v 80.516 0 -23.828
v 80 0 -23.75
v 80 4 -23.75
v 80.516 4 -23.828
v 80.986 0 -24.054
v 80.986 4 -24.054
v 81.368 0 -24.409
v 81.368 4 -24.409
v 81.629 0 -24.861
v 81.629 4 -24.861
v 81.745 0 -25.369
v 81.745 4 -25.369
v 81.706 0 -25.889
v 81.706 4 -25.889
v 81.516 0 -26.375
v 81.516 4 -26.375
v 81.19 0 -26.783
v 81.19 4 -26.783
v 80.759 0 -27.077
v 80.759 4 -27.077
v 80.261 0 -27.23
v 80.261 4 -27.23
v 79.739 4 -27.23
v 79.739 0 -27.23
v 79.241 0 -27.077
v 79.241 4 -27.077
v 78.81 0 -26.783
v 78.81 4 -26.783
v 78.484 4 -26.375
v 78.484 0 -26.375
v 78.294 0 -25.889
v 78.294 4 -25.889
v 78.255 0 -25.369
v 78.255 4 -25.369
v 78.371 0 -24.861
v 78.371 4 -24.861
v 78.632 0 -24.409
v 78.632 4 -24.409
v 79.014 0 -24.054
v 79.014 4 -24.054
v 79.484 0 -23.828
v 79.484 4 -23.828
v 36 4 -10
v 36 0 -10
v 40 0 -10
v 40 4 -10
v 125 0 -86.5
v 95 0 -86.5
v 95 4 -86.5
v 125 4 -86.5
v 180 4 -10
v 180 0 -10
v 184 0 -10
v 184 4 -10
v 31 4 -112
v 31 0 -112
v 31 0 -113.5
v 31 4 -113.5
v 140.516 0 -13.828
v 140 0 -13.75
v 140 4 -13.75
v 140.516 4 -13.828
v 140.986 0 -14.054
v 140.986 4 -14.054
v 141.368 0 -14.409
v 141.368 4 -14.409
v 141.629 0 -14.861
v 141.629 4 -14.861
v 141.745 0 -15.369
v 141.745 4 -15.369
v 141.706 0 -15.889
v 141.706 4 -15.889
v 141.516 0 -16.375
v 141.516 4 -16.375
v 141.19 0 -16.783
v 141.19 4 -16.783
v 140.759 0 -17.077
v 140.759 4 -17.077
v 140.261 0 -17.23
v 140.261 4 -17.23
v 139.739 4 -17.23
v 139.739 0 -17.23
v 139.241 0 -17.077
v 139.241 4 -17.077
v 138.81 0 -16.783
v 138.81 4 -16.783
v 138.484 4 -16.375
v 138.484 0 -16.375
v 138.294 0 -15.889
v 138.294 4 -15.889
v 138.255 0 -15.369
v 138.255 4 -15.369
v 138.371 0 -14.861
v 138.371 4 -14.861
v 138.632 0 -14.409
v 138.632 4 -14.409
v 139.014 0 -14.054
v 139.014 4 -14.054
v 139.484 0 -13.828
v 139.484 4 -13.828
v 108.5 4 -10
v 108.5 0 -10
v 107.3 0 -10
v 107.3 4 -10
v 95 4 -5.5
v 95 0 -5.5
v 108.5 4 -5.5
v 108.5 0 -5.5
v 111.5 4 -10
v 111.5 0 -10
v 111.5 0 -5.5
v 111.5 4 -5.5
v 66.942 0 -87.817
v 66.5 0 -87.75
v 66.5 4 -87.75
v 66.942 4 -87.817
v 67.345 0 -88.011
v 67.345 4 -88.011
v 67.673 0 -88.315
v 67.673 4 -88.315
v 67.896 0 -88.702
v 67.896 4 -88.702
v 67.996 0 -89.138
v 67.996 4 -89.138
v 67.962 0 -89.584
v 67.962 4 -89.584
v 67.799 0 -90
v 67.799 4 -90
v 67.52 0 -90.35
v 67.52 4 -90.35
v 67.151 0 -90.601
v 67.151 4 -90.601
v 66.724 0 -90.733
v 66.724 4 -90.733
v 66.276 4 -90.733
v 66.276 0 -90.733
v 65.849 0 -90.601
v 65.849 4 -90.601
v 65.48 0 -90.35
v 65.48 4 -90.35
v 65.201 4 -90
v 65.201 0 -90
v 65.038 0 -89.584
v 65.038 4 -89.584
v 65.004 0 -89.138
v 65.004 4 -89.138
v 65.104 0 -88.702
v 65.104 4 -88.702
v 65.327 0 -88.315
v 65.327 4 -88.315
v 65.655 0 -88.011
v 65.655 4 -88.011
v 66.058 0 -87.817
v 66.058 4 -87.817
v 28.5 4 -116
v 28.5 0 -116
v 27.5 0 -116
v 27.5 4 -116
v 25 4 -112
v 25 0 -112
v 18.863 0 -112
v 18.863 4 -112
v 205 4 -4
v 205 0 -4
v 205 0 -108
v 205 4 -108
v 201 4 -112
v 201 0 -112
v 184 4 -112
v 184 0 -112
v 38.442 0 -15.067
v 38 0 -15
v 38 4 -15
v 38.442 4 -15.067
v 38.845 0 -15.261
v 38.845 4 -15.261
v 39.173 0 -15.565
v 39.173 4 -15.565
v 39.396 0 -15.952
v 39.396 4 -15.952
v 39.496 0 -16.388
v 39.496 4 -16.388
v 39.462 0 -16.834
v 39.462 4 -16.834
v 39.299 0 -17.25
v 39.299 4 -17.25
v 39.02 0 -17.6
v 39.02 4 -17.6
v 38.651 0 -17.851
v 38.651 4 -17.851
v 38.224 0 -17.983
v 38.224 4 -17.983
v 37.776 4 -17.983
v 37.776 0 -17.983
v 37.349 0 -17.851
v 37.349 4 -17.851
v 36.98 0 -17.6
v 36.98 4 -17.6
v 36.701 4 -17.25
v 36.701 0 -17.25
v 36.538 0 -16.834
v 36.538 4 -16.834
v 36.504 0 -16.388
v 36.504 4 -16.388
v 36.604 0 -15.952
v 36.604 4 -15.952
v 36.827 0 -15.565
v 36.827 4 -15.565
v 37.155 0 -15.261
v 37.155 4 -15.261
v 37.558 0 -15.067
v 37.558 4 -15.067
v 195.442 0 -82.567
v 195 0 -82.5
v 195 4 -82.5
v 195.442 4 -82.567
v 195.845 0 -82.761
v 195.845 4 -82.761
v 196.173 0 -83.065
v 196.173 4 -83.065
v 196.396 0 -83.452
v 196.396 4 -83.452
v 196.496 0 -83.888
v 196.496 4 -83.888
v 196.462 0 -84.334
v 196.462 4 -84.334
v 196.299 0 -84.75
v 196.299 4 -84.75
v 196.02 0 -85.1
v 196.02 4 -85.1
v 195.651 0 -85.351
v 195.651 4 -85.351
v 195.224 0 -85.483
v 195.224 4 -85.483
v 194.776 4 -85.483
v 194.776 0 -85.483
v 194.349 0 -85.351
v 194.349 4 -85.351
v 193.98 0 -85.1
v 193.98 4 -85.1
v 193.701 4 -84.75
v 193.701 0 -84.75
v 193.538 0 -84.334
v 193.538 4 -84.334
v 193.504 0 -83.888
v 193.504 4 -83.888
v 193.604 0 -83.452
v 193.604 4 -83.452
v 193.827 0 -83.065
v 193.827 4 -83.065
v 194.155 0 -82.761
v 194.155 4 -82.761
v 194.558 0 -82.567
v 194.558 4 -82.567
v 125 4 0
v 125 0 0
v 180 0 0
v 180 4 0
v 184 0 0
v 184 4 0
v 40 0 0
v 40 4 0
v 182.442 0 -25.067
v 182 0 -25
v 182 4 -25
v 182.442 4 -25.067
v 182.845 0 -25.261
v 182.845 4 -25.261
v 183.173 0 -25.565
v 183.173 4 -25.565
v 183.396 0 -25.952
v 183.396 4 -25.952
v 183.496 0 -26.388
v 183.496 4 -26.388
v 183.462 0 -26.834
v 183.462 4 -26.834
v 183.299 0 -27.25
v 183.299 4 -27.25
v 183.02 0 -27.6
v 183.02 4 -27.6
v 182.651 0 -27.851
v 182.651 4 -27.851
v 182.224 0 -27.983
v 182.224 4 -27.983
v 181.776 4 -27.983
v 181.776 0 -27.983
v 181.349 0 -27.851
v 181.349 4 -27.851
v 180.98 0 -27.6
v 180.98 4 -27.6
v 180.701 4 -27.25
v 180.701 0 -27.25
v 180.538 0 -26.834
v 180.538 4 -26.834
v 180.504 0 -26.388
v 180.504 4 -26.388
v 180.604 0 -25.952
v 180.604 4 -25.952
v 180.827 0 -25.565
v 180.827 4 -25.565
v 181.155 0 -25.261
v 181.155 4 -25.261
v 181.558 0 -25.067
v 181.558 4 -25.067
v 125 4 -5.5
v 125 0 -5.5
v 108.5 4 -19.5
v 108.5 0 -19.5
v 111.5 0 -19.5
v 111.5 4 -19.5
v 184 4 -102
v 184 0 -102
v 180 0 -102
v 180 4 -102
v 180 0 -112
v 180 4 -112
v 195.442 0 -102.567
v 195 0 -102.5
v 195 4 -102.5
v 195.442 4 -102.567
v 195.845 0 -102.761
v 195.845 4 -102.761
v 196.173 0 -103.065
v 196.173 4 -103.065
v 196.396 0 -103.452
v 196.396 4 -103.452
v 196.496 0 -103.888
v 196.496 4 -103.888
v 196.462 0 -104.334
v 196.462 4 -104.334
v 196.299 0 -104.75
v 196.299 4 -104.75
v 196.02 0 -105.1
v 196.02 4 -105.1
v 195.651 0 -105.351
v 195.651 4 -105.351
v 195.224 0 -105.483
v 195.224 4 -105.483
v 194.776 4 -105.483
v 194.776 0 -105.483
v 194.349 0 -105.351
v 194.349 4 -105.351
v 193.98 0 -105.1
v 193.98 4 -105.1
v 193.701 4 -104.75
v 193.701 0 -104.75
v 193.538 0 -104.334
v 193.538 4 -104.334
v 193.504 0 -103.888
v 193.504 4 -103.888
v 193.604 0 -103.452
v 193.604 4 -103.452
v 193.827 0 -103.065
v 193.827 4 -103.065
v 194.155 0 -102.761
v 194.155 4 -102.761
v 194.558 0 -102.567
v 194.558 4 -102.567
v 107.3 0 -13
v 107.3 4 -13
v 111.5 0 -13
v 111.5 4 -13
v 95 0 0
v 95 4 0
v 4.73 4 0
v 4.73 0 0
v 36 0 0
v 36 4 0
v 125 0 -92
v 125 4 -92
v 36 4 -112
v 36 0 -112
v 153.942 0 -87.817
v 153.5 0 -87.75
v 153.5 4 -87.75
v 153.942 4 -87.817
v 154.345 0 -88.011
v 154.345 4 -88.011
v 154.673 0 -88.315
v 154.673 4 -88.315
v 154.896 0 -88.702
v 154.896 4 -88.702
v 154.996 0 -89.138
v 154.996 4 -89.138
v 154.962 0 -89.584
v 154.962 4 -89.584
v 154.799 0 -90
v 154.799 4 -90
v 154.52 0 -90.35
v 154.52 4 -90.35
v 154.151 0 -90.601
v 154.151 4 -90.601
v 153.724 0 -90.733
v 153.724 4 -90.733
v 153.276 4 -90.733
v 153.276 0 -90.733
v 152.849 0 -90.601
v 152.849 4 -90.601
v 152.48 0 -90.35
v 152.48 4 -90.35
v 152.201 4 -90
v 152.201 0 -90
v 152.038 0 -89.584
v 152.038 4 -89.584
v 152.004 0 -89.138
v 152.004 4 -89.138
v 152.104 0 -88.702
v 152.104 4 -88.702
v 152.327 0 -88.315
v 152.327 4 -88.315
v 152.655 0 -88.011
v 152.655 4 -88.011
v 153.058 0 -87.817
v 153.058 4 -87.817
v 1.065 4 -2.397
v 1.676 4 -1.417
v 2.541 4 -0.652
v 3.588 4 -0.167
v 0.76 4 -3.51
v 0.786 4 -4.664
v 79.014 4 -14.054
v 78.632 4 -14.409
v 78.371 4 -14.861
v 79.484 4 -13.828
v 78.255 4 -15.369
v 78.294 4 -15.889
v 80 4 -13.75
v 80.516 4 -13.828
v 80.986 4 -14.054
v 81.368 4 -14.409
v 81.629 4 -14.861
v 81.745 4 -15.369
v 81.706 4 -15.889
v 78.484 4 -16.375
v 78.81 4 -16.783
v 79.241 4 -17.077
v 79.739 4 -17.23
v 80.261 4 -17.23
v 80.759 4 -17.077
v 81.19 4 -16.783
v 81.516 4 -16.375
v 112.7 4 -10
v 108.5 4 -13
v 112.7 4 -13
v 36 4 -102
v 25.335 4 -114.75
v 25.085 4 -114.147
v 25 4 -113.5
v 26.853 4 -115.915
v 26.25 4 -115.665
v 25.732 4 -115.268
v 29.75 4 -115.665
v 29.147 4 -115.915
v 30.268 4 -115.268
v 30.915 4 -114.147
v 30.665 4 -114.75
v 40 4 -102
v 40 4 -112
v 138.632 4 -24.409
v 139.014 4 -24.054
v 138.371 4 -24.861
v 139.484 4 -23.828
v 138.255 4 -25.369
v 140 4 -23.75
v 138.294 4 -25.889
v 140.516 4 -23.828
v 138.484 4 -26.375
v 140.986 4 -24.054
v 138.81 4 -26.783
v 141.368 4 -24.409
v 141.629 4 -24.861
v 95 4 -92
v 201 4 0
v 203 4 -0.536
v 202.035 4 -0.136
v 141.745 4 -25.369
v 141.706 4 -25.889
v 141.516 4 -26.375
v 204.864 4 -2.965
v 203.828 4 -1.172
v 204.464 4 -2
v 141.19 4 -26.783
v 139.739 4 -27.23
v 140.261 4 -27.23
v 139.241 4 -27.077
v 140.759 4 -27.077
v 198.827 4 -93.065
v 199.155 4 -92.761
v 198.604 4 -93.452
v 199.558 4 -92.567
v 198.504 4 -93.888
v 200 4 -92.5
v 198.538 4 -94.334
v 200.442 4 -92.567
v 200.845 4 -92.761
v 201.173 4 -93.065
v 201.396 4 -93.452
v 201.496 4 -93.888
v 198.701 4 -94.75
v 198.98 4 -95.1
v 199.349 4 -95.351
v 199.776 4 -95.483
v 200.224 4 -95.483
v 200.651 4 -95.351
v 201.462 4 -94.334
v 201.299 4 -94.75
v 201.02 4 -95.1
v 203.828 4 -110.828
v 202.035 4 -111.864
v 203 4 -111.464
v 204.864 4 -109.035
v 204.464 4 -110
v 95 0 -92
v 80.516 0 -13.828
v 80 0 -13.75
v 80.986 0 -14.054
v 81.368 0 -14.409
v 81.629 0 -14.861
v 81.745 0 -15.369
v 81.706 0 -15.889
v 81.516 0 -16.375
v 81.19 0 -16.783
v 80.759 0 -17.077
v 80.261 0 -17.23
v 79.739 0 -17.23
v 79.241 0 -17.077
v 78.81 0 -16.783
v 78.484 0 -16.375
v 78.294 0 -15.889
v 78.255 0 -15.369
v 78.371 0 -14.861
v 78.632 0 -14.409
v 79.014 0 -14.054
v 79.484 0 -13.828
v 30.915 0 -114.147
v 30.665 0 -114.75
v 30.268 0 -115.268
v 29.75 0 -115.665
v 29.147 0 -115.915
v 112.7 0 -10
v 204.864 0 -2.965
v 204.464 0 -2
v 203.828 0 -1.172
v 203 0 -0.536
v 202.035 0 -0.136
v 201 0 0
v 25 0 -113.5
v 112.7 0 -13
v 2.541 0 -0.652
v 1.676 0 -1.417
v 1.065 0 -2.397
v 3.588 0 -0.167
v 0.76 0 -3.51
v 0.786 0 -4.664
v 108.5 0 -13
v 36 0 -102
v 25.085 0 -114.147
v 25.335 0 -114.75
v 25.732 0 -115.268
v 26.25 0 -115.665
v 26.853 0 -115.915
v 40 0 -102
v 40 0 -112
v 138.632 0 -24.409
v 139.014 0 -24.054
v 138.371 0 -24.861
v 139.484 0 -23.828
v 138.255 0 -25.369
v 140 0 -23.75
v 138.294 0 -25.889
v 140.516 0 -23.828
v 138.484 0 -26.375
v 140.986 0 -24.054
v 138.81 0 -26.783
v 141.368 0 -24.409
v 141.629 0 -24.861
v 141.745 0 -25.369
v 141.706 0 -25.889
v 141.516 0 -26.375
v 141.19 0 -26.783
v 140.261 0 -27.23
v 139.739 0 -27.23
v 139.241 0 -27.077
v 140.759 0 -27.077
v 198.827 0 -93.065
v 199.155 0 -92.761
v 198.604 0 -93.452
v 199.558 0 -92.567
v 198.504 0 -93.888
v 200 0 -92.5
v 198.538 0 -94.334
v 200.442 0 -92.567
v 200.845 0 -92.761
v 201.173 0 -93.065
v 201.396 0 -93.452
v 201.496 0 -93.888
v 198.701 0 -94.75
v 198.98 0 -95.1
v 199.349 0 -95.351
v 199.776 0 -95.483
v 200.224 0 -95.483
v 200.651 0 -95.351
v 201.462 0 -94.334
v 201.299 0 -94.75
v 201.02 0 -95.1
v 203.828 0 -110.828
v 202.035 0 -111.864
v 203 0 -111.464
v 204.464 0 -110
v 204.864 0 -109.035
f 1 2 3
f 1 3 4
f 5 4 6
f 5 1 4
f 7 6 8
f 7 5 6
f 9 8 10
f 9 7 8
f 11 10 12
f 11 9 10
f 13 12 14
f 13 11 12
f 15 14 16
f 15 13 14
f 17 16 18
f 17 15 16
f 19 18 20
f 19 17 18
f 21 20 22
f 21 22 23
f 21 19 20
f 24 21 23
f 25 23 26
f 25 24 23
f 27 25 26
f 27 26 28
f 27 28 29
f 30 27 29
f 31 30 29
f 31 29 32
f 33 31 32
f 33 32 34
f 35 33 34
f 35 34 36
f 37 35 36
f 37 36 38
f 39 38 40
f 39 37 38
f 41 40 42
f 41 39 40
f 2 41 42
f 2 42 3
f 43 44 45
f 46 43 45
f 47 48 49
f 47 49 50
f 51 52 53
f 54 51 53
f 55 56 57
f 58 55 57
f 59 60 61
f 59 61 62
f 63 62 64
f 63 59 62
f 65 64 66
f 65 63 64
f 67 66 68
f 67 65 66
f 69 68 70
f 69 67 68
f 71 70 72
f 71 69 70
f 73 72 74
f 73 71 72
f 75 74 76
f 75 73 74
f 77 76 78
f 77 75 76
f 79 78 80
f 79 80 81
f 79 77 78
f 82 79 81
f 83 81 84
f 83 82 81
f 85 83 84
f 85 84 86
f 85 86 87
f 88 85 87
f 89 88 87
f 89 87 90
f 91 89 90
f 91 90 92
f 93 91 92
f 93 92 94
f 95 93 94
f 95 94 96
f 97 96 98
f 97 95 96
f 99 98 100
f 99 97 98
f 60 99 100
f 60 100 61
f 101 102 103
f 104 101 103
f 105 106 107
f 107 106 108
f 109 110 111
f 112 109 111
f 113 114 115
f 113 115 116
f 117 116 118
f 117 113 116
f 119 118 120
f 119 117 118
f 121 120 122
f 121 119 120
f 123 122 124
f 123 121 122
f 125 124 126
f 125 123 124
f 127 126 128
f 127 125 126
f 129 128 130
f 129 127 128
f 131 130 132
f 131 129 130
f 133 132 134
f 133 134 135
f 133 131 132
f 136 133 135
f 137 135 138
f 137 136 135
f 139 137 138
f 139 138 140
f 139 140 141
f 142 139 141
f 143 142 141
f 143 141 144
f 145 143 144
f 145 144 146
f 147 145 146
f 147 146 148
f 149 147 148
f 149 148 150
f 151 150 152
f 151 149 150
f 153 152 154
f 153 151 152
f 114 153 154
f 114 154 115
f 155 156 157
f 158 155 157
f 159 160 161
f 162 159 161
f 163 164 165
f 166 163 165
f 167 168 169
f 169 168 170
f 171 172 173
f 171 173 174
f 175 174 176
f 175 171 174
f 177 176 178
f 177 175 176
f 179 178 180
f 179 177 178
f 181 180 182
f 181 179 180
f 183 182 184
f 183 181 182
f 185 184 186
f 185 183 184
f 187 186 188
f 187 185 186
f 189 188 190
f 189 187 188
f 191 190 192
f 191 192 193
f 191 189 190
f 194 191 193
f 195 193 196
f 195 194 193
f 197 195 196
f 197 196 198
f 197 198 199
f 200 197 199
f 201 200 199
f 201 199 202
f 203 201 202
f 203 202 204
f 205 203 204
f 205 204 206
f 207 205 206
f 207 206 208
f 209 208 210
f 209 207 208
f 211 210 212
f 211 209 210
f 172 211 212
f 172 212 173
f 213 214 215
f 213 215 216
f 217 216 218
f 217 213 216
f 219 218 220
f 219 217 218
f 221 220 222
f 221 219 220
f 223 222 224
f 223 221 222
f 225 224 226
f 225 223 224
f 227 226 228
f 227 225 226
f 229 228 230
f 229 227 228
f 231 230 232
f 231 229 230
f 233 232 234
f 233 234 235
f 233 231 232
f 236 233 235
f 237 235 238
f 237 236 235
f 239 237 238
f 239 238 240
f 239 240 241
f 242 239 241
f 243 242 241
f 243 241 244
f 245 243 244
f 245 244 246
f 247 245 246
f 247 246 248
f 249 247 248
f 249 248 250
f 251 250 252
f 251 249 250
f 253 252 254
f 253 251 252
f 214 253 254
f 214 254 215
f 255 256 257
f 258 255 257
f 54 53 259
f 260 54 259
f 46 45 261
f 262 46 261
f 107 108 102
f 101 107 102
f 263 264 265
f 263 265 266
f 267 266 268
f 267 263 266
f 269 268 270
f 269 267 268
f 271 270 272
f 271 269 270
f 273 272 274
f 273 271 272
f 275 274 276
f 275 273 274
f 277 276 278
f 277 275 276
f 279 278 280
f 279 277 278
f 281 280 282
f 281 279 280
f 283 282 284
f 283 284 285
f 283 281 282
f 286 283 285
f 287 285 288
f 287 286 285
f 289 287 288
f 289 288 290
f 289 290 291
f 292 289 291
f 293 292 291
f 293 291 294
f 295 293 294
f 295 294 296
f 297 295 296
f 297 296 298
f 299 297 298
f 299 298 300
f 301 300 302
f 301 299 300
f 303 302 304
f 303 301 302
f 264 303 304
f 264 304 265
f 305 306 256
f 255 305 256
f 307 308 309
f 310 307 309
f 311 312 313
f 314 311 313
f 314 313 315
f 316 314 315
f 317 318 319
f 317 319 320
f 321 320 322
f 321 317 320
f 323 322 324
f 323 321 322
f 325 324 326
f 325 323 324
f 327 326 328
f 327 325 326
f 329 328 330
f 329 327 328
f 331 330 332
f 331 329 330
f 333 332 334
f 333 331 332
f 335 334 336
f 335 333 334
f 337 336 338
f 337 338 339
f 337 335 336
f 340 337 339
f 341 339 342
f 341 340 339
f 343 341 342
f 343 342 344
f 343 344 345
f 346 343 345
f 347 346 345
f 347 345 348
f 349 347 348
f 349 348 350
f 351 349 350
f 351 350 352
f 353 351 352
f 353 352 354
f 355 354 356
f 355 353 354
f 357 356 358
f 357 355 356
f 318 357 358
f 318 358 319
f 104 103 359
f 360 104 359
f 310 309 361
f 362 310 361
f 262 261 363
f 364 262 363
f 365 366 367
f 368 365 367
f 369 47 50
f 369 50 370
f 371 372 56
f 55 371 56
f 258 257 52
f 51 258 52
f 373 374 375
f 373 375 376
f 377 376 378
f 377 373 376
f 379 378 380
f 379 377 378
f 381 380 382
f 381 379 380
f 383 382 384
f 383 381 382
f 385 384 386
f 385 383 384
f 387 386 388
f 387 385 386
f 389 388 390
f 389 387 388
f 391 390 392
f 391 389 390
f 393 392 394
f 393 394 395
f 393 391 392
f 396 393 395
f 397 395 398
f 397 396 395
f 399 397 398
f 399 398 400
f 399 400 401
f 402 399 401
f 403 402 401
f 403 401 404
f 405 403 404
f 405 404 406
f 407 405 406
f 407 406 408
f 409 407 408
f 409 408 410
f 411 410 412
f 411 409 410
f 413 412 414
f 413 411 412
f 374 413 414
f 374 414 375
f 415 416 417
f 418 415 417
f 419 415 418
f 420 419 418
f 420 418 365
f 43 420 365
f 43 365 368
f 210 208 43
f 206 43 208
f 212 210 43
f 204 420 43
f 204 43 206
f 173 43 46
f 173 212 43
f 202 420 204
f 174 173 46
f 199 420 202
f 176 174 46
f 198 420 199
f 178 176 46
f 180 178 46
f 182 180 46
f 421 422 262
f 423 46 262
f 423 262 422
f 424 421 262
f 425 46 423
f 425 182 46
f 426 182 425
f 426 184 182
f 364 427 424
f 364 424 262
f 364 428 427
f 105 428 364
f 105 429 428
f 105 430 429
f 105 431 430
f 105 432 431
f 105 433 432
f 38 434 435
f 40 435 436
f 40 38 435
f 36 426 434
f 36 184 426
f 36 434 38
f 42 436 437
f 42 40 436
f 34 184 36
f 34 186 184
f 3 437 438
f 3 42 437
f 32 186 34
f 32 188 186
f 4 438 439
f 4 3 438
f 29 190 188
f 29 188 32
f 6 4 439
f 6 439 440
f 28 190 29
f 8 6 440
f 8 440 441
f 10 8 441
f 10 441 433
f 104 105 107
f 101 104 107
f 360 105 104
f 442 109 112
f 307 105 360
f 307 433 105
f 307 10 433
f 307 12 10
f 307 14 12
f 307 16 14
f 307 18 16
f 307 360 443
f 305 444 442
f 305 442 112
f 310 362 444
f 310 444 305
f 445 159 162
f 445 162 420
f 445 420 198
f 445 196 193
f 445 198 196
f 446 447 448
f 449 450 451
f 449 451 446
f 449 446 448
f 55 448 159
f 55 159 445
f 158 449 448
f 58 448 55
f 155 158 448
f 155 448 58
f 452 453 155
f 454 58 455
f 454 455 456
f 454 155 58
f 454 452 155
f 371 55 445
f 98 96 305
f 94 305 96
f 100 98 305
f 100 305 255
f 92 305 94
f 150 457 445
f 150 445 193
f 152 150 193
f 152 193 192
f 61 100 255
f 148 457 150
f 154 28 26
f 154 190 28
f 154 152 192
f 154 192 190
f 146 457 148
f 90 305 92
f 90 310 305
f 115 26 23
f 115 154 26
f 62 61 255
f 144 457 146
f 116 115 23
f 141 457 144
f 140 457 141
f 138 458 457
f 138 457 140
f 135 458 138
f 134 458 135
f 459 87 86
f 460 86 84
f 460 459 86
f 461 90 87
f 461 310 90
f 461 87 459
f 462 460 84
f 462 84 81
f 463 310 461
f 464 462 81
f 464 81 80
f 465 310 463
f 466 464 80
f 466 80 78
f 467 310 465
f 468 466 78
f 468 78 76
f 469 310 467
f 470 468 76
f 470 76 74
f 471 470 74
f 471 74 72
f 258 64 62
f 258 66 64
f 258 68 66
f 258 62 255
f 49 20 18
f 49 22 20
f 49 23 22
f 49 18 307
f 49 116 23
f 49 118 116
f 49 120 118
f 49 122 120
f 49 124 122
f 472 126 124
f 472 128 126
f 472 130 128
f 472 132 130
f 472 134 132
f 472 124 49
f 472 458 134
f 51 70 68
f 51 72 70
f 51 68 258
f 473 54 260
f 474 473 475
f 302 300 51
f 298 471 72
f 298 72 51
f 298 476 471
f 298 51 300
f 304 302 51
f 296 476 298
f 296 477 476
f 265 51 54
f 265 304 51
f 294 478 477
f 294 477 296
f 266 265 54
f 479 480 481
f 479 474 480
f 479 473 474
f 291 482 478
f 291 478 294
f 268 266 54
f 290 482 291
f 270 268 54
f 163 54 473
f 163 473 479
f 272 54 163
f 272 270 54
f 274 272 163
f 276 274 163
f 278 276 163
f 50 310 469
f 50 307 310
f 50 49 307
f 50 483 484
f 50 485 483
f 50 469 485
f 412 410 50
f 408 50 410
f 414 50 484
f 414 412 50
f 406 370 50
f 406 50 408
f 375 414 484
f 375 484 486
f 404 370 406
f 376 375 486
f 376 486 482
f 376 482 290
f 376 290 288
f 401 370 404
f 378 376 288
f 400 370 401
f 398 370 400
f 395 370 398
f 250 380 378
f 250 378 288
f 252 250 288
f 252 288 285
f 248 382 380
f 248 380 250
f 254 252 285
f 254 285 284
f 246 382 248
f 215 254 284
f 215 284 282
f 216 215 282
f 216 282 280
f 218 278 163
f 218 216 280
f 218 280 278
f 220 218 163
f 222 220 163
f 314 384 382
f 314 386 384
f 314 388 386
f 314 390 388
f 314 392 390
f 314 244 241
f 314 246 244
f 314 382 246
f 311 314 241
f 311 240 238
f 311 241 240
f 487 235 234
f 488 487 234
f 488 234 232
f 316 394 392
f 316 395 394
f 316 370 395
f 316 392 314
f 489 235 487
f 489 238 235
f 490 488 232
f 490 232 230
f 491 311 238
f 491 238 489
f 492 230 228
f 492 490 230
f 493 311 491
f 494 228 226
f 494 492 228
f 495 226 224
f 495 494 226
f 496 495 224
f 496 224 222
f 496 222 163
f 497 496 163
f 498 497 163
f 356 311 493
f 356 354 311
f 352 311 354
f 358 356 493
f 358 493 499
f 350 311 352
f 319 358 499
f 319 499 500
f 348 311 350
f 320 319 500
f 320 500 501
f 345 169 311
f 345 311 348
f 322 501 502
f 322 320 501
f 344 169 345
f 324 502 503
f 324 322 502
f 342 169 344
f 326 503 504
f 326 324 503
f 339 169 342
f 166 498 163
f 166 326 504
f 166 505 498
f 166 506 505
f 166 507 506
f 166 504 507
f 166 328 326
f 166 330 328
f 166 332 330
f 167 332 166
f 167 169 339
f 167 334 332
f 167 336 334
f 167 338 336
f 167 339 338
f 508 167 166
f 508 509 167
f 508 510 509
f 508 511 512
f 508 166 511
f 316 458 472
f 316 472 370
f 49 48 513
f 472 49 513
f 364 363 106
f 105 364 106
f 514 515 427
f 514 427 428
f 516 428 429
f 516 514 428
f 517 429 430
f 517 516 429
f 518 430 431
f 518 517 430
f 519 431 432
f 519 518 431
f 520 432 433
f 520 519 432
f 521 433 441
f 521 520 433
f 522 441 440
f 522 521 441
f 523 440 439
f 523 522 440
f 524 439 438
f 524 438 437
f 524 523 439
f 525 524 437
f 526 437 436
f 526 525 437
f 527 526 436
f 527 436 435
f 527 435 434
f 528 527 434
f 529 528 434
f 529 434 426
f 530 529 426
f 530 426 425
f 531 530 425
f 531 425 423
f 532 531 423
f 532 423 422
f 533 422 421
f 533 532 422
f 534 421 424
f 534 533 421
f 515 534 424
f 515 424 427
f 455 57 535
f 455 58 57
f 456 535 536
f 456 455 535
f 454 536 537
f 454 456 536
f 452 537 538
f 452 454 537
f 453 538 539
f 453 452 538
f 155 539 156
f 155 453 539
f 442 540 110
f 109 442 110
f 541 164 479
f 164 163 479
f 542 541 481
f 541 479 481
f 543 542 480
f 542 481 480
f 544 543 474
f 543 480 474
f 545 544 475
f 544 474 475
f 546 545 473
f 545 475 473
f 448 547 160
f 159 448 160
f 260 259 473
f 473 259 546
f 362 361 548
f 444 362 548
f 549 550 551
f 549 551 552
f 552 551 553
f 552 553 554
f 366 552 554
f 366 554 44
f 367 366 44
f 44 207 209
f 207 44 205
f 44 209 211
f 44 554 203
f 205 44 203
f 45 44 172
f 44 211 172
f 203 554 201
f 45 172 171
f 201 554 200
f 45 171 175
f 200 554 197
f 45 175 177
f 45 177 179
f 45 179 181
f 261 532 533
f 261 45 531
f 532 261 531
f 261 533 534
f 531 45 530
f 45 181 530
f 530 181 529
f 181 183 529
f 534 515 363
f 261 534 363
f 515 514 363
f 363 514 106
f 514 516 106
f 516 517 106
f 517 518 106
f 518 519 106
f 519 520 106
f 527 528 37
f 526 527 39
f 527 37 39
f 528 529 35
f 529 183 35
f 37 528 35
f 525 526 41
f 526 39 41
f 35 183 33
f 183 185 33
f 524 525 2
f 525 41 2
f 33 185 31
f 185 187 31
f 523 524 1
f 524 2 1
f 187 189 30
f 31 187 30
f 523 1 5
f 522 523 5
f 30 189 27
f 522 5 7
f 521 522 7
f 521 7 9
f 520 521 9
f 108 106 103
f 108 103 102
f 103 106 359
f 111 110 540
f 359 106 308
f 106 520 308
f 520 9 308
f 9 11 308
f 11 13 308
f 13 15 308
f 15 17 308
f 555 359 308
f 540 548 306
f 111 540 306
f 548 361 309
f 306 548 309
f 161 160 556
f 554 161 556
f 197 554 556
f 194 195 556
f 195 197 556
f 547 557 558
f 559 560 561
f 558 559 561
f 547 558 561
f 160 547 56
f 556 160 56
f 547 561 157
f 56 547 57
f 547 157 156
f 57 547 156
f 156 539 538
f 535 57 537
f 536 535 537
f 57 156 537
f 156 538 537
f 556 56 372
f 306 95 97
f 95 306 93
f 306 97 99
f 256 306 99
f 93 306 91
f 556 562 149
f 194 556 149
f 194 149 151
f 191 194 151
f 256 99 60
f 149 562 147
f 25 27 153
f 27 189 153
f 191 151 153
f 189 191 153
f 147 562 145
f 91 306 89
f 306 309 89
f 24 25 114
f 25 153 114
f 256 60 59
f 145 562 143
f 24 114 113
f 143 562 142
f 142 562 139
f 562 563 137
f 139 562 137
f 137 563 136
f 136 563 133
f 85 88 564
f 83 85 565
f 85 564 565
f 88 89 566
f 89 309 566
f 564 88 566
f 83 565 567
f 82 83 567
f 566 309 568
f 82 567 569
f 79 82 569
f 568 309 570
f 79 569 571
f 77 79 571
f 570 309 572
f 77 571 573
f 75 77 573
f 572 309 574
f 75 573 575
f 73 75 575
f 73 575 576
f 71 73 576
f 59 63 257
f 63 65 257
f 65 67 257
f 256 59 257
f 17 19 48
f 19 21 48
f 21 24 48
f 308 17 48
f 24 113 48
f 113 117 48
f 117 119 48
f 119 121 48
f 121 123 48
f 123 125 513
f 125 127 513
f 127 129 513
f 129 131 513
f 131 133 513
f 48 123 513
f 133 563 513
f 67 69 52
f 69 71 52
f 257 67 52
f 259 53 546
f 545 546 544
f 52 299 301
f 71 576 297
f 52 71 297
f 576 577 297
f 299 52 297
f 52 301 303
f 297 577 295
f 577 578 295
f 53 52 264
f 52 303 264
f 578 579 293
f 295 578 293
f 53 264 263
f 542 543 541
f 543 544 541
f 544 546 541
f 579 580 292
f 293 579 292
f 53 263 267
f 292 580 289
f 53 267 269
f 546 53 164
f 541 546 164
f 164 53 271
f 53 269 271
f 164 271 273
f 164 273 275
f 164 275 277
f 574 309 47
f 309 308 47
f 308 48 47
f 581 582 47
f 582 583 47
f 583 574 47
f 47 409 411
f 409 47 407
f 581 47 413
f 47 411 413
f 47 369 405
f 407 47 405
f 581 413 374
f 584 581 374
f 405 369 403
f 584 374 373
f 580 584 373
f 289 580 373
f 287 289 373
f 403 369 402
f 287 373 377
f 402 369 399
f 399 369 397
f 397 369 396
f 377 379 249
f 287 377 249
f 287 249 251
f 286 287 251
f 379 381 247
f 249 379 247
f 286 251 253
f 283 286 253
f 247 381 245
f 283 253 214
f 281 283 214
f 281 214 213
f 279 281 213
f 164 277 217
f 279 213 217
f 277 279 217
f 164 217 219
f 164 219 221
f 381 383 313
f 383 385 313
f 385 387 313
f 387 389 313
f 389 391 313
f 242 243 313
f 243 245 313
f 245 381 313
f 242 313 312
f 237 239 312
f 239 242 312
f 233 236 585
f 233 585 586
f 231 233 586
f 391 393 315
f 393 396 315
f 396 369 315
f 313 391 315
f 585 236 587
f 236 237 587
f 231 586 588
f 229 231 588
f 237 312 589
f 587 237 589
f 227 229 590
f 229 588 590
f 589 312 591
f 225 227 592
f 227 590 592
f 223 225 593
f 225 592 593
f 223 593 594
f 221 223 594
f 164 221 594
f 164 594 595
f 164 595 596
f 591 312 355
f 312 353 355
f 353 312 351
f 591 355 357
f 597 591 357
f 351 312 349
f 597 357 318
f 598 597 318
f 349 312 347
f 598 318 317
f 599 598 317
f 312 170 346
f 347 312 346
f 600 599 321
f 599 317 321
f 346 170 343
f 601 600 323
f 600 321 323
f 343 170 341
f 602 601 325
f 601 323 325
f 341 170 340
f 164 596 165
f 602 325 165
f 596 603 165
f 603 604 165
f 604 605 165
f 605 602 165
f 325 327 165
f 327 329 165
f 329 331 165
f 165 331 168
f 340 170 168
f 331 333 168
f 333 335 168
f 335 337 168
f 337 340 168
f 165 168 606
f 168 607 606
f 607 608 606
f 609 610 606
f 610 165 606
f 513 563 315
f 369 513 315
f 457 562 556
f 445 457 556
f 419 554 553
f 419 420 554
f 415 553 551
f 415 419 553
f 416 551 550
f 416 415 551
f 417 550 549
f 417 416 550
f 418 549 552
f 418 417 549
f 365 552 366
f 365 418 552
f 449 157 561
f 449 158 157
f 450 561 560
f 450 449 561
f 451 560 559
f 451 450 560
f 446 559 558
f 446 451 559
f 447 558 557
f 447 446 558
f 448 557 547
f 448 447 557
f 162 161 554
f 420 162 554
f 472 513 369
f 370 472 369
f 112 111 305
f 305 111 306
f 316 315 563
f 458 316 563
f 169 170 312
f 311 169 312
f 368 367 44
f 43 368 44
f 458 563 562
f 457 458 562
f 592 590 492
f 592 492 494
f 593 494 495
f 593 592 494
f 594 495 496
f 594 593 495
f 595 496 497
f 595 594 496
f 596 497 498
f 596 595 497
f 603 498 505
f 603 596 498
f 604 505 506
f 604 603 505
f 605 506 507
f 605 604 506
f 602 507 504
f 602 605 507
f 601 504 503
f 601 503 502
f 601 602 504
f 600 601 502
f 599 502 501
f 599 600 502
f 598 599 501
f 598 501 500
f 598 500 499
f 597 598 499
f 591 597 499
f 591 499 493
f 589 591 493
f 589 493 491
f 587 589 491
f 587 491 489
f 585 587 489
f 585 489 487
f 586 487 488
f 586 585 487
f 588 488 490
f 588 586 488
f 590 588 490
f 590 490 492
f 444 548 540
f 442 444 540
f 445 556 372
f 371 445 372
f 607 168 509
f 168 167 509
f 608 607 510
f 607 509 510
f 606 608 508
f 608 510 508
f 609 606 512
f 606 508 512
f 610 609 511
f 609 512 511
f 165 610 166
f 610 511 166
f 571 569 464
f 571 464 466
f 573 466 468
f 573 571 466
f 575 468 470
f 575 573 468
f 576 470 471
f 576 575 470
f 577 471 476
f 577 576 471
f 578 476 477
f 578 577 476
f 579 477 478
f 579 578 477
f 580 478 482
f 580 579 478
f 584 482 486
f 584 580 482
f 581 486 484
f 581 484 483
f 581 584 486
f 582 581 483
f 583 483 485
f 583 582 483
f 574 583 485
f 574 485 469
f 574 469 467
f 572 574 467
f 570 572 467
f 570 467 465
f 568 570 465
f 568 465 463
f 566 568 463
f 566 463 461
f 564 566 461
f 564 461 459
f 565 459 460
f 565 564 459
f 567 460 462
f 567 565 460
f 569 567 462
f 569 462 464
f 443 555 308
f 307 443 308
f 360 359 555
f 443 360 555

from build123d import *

# Parameters (mm, degrees)
SKETCH1_R           = 1.5
SKETCH1_R_2         = 1.75
SKETCH1_W           = 30
SKETCH1_H           = 5.5
BOSS_EXTRUDE1_DEPTH = 4
FILLET1_R           = 4
FILLET2_R           = 4
FILLET3_R           = 4
FILLET4_R           = 2.5


with BuildPart() as part:
    # Sketch1 → Boss-Extrude1 (new body)
    with BuildSketch(Plane(origin=(0, 0, 0), x_dir=(1, 0, 0), z_dir=(0, 1, 0))):
        Polygon((158.5, 0), (180, 0), (180, 10), (184, 10), (184, 0), (205, 0), (205, 112), (184, 112), (184, 102), (180, 102), (180, 112), (40, 112), (40, 102), (36, 102), (36, 112), (31, 112), (31, 116), (25, 116), (25, 112), (18.8632, 112), (0, 0), (36, 0), (36, 10), (40, 10), (40, 0), (95, 0), (95, 5.5), (108.5, 5.5), (108.5, 10), (107.3, 10), (107.3, 13), (108.5, 13), (108.5, 19.5), (111.5, 19.5), (111.5, 13), (112.7, 13), (112.7, 10), (111.5, 10), (111.5, 5.5), (125, 5.5), (125, 0), (155.5, 0), align=None)
        with Locations(Location((153.5, 89.25, 0), (0, 0, 270))):
            Circle(SKETCH1_R, mode=Mode.SUBTRACT)
        with Locations(Location((66.5, 89.25, 0), (0, 0, 270))):
            Circle(SKETCH1_R, mode=Mode.SUBTRACT)
        with Locations(Location((195, 104, 0), (0, 0, 270))):
            Circle(SKETCH1_R, mode=Mode.SUBTRACT)
        with Locations(Location((195, 84, 0), (0, 0, 270))):
            Circle(SKETCH1_R, mode=Mode.SUBTRACT)
        with Locations(Location((200, 94, 0), (0, 0, 270))):
            Circle(SKETCH1_R, mode=Mode.SUBTRACT)
        with Locations(Location((80, 15.5, 0), (0, 0, 270))):
            Circle(SKETCH1_R_2, mode=Mode.SUBTRACT)
        with Locations(Location((80, 25.5, 0), (0, 0, 270))):
            Circle(SKETCH1_R_2, mode=Mode.SUBTRACT)
        with Locations(Location((140, 15.5, 0), (0, 0, 270))):
            Circle(SKETCH1_R_2, mode=Mode.SUBTRACT)
        with Locations(Location((140, 25.5, 0), (0, 0, 270))):
            Circle(SKETCH1_R_2, mode=Mode.SUBTRACT)
        with Locations(Location((182, 26.5, 0), (0, 0, 270))):
            Circle(SKETCH1_R, mode=Mode.SUBTRACT)
        with Locations(Location((38, 16.5, 0), (0, 0, 270))):
            Circle(SKETCH1_R, mode=Mode.SUBTRACT)
        with Locations((110, 89.25)):
            Rectangle(SKETCH1_W, SKETCH1_H, mode=Mode.SUBTRACT)
    extrude(amount=BOSS_EXTRUDE1_DEPTH)

    # Fillet1
    fillet1_edges = [part.edges().sort_by_distance(p)[0] for p in [
        (0, 2, 0),
    ]]
    fillet(fillet1_edges, radius=FILLET1_R)

    # Fillet2
    fillet2_edges = [part.edges().sort_by_distance(p)[0] for p in [
        (205, 2, -112),
    ]]
    fillet(fillet2_edges, radius=FILLET2_R)

    # Fillet3
    fillet3_edges = [part.edges().sort_by_distance(p)[0] for p in [
        (205, 2, 0),
    ]]
    fillet(fillet3_edges, radius=FILLET3_R)

    # Fillet4
    fillet4_edges = [part.edges().sort_by_distance(p)[0] for p in [
        (25, 2, -116),
        (31, 2, -116),
    ]]
    fillet(fillet4_edges, radius=FILLET4_R)


solid = part.part
